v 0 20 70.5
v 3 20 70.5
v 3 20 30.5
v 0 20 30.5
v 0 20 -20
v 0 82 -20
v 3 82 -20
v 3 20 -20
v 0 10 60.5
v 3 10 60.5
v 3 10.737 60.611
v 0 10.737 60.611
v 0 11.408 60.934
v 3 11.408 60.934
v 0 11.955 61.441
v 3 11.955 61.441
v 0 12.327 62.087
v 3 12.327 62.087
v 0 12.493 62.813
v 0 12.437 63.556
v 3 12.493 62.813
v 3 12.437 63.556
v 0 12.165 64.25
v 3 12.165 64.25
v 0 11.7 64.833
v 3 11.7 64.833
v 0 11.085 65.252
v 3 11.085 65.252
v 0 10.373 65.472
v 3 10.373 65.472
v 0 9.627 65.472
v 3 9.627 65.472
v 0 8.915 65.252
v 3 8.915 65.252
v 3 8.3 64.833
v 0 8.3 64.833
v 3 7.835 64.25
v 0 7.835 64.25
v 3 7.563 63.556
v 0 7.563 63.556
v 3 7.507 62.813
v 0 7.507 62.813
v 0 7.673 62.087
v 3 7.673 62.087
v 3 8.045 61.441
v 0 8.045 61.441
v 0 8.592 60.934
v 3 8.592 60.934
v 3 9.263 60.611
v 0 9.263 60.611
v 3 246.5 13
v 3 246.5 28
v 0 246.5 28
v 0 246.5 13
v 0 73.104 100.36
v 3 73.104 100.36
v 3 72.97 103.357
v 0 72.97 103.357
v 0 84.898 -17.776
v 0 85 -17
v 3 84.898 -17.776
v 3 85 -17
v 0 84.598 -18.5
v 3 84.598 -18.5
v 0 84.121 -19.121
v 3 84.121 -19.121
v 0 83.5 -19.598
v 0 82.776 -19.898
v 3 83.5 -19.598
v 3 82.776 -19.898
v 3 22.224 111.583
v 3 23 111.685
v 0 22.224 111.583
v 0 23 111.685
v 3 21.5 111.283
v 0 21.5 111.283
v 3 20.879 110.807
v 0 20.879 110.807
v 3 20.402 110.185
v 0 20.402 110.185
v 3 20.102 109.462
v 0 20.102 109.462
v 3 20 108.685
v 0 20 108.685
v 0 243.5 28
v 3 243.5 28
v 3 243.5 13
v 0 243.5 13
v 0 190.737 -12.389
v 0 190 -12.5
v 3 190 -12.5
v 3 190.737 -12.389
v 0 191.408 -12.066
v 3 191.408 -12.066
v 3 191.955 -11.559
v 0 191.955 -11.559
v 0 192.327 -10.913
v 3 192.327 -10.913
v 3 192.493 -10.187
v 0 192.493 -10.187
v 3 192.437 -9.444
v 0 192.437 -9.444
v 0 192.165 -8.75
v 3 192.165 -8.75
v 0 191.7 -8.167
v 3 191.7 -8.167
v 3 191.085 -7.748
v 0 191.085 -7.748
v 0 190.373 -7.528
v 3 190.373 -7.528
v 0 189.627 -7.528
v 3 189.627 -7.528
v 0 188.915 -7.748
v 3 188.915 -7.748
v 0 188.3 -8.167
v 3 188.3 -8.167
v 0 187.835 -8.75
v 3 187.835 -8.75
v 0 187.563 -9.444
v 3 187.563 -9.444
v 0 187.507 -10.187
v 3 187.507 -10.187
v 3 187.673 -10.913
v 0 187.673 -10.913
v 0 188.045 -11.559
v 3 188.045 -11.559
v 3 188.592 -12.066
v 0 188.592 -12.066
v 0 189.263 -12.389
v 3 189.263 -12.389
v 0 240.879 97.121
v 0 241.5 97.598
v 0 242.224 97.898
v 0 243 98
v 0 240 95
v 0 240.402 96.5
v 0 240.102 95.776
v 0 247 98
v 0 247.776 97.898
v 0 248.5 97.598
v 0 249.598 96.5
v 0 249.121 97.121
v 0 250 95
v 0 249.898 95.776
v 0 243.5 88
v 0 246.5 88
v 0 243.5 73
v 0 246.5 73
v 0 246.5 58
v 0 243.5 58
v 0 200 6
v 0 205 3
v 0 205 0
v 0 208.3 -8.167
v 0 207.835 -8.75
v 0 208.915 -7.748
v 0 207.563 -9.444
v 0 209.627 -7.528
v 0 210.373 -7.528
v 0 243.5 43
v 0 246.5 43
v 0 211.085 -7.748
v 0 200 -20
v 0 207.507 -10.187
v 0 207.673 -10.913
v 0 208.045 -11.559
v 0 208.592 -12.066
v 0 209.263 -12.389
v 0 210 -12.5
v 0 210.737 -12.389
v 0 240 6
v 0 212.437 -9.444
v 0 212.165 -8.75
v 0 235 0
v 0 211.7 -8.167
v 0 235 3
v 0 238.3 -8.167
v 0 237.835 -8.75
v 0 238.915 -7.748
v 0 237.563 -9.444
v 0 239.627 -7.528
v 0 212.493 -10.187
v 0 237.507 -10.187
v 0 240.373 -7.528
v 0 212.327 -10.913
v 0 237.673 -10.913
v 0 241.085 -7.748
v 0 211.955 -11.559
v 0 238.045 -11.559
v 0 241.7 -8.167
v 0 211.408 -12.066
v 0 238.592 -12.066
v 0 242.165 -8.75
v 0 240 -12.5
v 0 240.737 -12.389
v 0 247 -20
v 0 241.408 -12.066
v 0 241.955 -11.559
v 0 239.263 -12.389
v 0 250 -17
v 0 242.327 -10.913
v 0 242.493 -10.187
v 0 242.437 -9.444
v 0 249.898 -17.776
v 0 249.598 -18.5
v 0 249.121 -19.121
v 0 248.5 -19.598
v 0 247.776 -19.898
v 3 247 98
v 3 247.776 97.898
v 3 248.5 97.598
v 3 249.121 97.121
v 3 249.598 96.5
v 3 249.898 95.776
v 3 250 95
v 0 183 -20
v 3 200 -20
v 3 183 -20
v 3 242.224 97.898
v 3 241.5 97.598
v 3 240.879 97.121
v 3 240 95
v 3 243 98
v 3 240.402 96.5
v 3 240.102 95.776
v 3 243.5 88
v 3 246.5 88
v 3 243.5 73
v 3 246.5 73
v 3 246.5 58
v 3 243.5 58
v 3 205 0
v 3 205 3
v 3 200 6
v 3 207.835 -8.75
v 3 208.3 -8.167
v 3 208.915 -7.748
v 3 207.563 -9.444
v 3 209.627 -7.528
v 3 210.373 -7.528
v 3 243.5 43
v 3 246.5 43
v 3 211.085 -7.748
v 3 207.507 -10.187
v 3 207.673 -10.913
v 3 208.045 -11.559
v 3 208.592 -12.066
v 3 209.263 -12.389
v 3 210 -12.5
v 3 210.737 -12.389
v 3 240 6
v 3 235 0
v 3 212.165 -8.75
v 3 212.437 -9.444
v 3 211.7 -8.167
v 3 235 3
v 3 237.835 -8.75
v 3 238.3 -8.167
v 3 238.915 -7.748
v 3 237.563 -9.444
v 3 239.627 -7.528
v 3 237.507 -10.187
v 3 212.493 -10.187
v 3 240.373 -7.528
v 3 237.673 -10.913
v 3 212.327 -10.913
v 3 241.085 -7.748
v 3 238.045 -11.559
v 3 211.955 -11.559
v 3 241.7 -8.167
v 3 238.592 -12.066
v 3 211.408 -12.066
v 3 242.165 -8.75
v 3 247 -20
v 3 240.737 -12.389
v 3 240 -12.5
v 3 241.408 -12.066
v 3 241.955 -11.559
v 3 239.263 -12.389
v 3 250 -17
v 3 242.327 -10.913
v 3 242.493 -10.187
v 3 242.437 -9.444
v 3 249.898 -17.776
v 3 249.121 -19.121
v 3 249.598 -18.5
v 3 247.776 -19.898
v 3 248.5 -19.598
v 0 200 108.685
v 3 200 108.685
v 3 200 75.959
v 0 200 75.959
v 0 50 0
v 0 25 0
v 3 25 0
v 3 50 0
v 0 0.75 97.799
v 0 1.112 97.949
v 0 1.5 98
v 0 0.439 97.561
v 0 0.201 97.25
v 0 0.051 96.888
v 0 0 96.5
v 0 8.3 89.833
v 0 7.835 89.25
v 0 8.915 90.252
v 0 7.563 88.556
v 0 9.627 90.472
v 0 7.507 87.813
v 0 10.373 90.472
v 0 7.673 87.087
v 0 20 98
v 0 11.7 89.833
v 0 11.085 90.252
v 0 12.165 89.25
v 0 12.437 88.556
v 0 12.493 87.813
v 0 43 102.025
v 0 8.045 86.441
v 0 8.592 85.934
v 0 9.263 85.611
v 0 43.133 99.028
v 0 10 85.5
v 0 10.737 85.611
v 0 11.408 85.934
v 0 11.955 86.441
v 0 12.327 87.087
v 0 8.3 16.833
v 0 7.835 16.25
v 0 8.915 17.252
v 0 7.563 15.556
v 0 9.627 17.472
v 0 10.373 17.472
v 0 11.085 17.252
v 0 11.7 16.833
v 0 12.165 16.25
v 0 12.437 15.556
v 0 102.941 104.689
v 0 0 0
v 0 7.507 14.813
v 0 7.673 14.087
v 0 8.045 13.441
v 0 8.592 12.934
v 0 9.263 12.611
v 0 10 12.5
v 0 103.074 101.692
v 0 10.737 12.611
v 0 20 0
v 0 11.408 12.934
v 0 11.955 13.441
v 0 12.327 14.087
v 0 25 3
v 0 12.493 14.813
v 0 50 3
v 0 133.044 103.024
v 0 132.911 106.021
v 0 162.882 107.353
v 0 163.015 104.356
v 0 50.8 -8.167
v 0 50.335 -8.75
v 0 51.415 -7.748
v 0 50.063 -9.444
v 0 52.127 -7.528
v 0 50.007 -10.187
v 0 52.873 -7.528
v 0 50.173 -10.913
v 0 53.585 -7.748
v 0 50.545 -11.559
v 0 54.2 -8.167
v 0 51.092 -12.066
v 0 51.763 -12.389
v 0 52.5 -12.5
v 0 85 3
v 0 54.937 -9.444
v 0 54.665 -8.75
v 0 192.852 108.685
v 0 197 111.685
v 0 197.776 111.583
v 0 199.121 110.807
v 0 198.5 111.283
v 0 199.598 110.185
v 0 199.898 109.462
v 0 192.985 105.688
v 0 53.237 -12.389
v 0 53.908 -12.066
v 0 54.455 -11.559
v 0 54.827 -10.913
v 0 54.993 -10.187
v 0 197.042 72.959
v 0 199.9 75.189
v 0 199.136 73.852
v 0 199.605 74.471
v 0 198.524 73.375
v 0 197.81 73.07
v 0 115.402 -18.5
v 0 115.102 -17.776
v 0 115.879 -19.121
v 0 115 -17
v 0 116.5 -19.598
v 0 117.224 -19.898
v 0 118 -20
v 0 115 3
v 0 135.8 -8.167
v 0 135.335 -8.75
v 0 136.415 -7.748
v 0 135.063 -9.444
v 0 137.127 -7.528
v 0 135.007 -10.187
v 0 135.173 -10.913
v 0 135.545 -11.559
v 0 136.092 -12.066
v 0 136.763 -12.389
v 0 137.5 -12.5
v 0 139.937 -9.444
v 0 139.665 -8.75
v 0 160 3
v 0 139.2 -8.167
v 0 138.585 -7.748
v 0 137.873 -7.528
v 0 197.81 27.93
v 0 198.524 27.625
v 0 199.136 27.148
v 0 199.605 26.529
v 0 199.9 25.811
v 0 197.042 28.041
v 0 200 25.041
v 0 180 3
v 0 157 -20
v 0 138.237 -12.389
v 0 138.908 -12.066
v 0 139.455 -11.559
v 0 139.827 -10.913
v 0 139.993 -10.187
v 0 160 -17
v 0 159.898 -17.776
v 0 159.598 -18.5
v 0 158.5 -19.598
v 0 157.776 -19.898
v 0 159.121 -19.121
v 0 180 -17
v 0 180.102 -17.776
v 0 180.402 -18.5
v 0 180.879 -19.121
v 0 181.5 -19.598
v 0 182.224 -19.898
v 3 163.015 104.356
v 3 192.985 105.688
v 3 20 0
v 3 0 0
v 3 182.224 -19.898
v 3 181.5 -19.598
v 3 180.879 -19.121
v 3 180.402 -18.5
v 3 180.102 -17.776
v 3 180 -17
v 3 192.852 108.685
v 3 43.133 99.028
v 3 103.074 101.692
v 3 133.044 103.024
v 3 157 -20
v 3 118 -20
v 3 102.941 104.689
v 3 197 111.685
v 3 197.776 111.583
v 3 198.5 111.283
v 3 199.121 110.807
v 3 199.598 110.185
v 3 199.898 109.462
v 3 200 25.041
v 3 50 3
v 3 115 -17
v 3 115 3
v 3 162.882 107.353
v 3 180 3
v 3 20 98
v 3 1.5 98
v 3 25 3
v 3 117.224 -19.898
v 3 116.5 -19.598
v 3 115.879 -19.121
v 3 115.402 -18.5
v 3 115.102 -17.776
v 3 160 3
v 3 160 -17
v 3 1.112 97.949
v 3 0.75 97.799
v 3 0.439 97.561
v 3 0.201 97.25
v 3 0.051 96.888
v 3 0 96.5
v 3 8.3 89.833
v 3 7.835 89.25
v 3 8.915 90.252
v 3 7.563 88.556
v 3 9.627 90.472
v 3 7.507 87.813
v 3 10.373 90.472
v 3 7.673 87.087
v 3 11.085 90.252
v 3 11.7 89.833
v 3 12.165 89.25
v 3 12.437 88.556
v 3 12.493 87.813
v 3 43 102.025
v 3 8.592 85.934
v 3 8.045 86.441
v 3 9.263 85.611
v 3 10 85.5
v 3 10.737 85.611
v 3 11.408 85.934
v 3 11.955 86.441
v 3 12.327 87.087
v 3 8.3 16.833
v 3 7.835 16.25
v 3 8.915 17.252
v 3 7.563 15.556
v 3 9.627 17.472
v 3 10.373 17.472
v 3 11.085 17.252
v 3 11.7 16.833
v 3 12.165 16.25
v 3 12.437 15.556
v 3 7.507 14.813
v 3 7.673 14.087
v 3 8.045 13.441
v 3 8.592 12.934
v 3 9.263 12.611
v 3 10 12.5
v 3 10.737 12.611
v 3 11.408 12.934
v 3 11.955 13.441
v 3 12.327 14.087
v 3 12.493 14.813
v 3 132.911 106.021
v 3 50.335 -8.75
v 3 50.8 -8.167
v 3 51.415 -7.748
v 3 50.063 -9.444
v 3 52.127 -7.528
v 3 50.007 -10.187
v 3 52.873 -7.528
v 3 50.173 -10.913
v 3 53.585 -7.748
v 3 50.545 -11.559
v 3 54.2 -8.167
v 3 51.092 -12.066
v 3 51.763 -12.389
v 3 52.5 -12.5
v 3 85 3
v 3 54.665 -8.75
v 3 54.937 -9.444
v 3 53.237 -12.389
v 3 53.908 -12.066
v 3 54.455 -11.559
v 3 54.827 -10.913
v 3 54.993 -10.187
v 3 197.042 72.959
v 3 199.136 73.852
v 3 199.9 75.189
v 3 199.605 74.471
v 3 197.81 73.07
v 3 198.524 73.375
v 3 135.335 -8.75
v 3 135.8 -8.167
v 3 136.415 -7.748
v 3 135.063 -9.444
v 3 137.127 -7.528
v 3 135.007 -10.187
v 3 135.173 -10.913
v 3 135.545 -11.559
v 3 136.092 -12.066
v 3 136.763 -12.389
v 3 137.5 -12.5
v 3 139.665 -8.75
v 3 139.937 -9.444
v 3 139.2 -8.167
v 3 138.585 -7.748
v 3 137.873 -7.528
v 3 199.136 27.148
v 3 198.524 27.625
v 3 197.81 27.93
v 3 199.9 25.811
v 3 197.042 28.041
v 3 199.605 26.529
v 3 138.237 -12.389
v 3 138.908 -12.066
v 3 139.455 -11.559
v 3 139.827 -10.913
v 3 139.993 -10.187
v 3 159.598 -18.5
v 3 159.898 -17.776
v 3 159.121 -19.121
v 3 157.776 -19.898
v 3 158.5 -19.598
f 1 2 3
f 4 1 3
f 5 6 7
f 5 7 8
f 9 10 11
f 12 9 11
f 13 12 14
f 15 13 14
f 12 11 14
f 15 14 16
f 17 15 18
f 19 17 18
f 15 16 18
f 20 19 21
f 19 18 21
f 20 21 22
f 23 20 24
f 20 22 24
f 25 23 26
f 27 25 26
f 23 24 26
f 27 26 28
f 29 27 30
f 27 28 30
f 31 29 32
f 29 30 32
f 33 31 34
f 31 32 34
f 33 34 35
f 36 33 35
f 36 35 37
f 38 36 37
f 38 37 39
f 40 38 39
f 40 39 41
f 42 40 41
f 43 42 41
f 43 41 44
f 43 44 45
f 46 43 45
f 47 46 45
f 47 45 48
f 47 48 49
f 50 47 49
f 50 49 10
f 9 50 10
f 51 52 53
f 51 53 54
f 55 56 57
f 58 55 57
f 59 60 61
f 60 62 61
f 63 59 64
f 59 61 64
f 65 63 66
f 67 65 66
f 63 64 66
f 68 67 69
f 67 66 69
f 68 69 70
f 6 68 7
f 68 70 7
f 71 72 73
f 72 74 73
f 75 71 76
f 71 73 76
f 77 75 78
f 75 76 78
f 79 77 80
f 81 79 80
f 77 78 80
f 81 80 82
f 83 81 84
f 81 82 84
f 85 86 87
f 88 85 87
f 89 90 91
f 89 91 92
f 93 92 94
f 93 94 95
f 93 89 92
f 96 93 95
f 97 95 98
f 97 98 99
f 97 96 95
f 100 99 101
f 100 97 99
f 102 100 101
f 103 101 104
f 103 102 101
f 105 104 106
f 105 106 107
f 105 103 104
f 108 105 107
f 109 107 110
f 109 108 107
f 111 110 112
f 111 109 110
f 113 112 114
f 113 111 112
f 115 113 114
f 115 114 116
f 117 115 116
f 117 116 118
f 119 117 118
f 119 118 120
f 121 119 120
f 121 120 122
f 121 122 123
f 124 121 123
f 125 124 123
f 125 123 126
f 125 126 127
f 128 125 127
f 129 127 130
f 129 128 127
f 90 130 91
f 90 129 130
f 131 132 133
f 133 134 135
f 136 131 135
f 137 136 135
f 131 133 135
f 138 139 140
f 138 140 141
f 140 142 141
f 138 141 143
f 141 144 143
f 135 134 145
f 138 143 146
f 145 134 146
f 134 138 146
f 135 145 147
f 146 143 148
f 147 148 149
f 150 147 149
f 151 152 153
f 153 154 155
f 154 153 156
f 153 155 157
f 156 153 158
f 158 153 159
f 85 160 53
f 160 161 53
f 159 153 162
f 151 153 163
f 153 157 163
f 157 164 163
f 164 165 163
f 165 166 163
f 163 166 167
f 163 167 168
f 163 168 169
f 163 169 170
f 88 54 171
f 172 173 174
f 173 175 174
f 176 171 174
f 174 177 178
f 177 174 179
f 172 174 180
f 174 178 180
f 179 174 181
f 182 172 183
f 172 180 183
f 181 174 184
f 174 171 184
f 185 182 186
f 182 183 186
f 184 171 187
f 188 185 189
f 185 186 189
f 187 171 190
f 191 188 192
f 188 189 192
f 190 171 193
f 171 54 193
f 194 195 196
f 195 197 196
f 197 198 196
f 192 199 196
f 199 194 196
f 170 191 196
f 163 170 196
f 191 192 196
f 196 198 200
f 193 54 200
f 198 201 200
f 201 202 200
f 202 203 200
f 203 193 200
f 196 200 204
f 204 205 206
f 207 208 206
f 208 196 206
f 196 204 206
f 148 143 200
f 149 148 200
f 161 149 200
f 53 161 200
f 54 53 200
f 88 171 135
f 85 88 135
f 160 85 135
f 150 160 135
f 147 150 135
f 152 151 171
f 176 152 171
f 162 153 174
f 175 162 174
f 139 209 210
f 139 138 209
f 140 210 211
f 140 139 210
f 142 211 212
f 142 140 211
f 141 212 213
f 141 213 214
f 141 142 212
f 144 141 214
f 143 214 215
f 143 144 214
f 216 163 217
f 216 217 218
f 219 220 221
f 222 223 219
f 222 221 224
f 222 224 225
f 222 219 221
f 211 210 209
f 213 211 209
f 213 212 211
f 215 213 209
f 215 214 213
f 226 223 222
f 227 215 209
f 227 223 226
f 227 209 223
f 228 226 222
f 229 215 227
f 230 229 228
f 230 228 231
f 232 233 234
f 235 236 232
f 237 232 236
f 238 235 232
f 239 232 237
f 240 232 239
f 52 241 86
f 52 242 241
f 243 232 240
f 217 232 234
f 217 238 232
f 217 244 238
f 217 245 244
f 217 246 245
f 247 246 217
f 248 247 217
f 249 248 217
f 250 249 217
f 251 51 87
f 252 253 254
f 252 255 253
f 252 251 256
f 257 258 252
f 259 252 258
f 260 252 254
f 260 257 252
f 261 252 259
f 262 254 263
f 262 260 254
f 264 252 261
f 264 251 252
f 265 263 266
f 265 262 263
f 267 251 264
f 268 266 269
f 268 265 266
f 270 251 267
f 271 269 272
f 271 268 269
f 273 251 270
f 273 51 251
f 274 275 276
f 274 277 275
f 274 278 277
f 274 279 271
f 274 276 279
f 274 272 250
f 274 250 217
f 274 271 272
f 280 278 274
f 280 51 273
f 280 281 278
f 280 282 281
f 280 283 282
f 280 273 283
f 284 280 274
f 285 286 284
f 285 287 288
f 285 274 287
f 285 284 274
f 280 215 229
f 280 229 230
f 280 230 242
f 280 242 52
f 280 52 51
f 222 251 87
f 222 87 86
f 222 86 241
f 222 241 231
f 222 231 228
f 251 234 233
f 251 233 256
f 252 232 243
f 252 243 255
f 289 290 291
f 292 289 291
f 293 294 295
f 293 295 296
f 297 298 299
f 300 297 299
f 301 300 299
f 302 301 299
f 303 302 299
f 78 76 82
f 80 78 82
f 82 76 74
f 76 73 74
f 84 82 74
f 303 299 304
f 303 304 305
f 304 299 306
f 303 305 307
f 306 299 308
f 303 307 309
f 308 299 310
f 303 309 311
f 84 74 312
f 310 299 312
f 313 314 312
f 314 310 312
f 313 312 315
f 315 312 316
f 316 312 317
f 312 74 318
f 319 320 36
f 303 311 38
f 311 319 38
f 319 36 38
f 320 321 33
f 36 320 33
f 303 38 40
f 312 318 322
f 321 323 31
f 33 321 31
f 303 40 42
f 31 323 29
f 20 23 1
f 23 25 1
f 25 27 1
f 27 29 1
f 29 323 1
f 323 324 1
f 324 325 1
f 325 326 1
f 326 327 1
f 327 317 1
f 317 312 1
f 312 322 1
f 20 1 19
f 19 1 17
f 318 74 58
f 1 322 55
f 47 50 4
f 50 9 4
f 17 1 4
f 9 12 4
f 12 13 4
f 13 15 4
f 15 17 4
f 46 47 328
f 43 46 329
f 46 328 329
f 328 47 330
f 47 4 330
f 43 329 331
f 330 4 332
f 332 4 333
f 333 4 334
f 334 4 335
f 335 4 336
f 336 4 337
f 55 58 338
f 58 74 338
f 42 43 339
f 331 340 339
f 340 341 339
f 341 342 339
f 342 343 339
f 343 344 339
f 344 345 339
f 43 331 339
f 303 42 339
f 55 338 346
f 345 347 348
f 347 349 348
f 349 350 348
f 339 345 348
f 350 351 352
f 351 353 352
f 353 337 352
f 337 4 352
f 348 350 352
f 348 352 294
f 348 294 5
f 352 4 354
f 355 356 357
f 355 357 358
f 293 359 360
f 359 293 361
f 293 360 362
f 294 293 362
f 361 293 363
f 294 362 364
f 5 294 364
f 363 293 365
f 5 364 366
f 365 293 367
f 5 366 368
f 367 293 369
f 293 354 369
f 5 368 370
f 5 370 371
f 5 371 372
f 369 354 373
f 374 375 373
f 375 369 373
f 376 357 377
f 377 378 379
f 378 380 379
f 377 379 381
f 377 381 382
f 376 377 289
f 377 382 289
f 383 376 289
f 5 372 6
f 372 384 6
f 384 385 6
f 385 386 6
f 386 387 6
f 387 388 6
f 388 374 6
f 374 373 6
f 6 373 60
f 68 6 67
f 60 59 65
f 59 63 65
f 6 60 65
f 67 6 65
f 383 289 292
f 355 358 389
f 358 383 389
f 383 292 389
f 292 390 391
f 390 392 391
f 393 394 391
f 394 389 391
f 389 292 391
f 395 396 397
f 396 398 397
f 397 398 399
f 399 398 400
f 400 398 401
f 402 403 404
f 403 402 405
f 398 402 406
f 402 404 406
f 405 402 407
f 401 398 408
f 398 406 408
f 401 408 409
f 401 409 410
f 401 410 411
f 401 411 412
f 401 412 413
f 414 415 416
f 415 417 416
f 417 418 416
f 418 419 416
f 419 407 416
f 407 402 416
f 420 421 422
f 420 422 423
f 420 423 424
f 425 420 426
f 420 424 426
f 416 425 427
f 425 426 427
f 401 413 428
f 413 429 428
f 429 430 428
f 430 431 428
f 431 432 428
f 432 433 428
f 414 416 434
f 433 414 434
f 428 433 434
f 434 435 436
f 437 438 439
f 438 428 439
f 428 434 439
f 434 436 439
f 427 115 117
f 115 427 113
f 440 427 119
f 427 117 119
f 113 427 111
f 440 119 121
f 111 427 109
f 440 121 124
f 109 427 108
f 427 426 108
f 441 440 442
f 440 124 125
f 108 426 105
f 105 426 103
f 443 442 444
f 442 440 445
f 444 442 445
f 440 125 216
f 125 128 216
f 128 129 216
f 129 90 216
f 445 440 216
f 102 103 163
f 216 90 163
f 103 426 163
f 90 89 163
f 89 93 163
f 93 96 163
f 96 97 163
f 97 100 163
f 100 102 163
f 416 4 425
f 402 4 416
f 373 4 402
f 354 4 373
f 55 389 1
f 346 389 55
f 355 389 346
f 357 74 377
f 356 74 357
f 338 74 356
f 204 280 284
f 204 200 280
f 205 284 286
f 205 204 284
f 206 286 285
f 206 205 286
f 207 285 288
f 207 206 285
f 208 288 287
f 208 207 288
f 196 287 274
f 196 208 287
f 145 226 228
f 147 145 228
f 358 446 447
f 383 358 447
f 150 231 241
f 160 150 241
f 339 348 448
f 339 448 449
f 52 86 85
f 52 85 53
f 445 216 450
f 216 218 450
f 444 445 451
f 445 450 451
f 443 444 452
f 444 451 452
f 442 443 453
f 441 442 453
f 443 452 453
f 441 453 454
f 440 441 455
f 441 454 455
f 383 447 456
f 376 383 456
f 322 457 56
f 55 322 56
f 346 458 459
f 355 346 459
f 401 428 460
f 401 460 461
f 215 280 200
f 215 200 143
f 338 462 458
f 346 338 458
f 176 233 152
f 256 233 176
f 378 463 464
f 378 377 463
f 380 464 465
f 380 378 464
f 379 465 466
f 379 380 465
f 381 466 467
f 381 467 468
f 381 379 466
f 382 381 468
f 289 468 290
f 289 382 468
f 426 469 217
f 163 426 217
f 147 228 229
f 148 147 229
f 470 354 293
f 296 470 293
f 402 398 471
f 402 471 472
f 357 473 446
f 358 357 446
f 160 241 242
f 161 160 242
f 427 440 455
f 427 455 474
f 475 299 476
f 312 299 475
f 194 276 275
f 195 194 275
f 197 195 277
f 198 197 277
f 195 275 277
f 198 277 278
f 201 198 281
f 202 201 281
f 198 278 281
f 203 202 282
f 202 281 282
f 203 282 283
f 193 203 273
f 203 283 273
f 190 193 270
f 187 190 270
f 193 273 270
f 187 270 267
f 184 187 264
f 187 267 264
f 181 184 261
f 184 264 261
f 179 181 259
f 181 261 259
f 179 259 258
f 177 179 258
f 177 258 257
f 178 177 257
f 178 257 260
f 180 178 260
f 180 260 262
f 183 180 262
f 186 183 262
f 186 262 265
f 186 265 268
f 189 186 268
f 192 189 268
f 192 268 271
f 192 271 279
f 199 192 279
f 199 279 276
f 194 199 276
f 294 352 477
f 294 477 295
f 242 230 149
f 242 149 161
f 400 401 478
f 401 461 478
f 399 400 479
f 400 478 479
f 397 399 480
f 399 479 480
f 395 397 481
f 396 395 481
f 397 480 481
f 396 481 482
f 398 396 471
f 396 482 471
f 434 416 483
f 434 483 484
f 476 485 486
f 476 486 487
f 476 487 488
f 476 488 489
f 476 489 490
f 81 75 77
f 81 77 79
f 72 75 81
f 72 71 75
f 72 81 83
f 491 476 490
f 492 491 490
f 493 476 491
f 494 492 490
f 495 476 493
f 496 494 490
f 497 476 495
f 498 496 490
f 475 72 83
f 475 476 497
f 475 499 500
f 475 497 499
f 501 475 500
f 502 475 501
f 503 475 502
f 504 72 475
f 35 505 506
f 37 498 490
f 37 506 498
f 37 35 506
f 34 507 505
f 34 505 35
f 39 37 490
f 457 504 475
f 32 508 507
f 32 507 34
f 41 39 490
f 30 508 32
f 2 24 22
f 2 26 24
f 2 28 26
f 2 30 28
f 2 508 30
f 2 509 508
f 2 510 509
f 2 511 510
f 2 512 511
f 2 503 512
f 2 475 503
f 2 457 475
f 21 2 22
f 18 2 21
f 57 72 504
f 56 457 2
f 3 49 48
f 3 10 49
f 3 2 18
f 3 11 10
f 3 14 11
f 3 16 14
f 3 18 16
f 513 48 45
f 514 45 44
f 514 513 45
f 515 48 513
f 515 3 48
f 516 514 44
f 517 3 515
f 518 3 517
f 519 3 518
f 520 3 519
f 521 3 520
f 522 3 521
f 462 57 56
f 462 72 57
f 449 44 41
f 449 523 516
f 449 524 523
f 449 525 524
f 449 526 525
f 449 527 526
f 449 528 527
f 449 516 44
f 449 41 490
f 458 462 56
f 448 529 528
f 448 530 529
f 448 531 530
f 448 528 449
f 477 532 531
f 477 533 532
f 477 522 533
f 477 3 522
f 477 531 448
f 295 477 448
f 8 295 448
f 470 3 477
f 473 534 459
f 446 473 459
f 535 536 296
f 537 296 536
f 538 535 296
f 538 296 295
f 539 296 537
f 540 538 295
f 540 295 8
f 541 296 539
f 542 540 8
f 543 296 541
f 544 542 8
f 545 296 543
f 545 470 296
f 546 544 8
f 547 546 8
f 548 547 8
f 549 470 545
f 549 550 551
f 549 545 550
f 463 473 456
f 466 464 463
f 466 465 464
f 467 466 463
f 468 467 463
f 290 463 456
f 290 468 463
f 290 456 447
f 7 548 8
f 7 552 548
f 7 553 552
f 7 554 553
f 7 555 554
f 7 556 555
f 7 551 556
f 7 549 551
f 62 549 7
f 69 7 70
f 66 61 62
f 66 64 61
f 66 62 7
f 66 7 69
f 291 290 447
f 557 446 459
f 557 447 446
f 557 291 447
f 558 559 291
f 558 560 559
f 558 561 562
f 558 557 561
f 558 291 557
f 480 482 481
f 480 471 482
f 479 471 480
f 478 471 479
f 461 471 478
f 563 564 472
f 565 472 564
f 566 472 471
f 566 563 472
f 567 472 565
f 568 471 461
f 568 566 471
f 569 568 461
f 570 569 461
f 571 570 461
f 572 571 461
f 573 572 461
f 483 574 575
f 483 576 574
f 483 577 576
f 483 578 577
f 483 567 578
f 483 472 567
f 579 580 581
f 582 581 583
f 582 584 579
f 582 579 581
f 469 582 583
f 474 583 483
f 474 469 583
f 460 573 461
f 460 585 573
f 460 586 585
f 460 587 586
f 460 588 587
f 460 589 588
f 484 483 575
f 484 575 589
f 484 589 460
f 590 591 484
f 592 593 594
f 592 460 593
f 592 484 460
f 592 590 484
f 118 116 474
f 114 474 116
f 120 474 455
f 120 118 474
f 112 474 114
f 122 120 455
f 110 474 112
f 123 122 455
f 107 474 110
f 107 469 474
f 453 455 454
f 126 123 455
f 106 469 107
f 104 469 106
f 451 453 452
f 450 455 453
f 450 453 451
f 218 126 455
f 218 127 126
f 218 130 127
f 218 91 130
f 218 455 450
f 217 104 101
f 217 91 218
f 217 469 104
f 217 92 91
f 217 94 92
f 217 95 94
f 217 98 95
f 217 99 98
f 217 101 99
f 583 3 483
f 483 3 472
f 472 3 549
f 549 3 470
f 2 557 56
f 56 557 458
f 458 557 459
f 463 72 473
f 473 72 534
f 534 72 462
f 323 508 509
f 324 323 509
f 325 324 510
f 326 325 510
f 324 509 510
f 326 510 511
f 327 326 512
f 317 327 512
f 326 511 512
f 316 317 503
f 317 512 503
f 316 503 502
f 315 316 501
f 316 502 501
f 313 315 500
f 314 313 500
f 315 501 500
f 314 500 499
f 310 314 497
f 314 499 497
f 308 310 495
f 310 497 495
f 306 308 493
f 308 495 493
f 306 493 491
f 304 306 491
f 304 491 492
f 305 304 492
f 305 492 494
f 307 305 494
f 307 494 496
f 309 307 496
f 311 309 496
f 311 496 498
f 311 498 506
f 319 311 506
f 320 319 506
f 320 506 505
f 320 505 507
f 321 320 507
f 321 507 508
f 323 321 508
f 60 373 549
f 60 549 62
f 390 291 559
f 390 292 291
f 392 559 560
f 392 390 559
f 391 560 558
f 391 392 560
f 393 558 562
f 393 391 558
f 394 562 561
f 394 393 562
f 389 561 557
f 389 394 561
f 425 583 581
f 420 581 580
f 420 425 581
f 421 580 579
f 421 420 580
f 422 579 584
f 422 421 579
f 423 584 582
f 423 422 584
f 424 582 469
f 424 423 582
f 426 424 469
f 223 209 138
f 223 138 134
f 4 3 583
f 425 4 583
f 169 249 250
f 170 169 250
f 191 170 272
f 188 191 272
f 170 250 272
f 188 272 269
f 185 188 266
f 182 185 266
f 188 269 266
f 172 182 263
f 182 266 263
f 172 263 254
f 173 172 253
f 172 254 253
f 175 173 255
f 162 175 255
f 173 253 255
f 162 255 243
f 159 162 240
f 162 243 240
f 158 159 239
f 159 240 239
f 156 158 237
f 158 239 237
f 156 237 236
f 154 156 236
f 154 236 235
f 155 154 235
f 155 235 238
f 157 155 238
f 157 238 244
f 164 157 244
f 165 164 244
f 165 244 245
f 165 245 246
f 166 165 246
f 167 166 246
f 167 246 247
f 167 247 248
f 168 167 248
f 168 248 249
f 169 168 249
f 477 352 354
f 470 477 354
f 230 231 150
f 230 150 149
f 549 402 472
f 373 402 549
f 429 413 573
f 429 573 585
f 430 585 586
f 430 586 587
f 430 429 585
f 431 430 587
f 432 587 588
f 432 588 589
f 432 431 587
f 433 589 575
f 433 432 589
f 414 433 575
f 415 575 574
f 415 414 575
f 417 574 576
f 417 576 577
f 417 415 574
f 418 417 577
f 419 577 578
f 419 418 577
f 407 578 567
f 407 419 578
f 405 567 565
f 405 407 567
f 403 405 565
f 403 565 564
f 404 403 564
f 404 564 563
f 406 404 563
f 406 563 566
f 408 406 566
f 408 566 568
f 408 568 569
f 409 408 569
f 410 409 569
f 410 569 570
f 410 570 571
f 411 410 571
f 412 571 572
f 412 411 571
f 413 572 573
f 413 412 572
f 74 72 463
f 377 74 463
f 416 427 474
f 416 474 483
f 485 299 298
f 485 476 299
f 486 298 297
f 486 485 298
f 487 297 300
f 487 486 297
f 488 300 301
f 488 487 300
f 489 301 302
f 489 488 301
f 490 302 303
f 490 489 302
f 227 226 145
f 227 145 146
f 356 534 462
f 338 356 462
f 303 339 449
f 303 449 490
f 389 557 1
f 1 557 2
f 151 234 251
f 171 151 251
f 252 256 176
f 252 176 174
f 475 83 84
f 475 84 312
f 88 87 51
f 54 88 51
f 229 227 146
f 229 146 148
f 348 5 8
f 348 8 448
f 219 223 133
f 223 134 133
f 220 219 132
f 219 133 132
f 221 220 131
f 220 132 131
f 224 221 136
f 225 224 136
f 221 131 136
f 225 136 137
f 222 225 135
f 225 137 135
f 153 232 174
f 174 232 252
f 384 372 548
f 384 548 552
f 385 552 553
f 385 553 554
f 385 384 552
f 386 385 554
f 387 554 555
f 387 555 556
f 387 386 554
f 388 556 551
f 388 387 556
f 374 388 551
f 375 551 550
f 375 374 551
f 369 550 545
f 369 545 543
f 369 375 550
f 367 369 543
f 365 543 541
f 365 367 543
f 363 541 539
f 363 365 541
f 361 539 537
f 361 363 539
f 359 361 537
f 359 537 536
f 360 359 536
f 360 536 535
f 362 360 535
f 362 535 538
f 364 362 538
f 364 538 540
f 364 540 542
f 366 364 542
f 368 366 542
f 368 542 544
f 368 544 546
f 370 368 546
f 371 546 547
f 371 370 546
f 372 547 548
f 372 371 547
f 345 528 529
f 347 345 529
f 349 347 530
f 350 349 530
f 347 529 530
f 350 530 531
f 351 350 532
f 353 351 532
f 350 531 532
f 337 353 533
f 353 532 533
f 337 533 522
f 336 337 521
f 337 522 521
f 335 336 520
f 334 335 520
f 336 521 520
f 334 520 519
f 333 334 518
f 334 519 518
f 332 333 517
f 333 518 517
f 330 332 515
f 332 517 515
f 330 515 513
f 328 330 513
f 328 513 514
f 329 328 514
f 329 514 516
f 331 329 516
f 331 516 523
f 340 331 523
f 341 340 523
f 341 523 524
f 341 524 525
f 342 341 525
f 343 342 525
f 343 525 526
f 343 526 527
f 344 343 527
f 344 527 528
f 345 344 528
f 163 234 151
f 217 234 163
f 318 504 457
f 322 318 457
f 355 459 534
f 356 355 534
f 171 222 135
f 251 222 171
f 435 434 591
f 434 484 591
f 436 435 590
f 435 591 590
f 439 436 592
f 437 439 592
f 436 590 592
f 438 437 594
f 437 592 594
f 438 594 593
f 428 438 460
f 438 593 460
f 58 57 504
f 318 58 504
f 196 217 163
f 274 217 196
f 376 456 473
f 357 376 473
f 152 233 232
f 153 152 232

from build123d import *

# Parameters (mm, degrees)
SKETCH1_R           = 2.5
SKETCH1_W           = 3
SKETCH1_H           = 25
BOSS_EXTRUDE1_DEPTH = 3
SKETCH4_W           = 15
SKETCH4_H           = 3
BOSS_EXTRUDE2_DEPTH = 3
SKETCH5_W           = 13.685275767
SKETCH5_H           = 180
BOSS_EXTRUDE3_DEPTH = 3
CUT_EXTRUDE3_DEPTH  = 4
FILLET1_R           = 3
SKETCH12_R          = 2.5
CUT_EXTRUDE7_DEPTH  = 4
FILLET2_R           = 1.5
SKETCH13_R          = 2.5
CUT_EXTRUDE8_DEPTH  = 4
SKETCH15_R          = 2.5
CUT_EXTRUDE9_DEPTH  = 10
SKETCH17_W          = 3
SKETCH17_H          = 30
CUT_EXTRUDE10_DEPTH = 4
SKETCH16_W          = 3
SKETCH16_H          = 40
BOSS_EXTRUDE4_DEPTH = 3
FILLET3_R           = 3


with BuildPart() as part:
    # Sketch1 → Boss-Extrude1 (new body)
    with BuildSketch(Plane(origin=(0, 0, 0), x_dir=(0, 0, -1), z_dir=(1, 0, 0))):
        Polygon((0, 0), (-98, 0), (-98, 200), (20, 200), (20, 180), (-3, 180), (-3, 160), (20, 160), (20, 115), (-3, 115), (-3, 85), (20, 85), (20, 20), (0, 20), align=None)
        with Locations((10, 190)):
            Circle(SKETCH1_R, mode=Mode.SUBTRACT)
        with Locations((10, 137.5)):
            Circle(SKETCH1_R, mode=Mode.SUBTRACT)
        with Locations((10, 52.5)):
            Circle(SKETCH1_R, mode=Mode.SUBTRACT)
        with Locations((-1.5, 37.5)):
            Rectangle(SKETCH1_W, SKETCH1_H, mode=Mode.SUBTRACT)
    extrude(amount=BOSS_EXTRUDE1_DEPTH)

    # Sketch5 → Boss-Extrude3 (add)
    with BuildSketch(Plane(origin=(3, 0, 0), x_dir=(0, 0, -1), z_dir=(1, 0, 0))):
        with Locations((-104.842637884, 110)):
            Rectangle(SKETCH5_W, SKETCH5_H)
        Polygon((-105.688234347, 192.985272811), (-108.685275767, 192.85207097), (-107.353257358, 162.881656776), (-104.356215939, 163.014858617), align=None, mode=Mode.SUBTRACT)
        Polygon((-103.02419753, 133.044444423), (-106.021238949, 132.911242582), (-104.689220541, 102.940828388), (-101.692179121, 103.074030229), align=None, mode=Mode.SUBTRACT)
        Polygon((-100.360160713, 73.103616035), (-103.357202132, 72.970414194), (-102.025183723, 43), (-99.028142304, 43.133201841), align=None, mode=Mode.SUBTRACT)
    extrude(amount=-BOSS_EXTRUDE3_DEPTH)

    # Sketch6 → Cut-Extrude3 (cut)
    with BuildSketch(Plane(origin=(3, 0, 0), x_dir=(0, 0, -1), z_dir=(1, 0, 0))):
        Polygon((-28, 200), (-73, 200), (-70.5, 20), (-30.5, 20), align=None)
    extrude(amount=-CUT_EXTRUDE3_DEPTH, mode=Mode.SUBTRACT)

    # Fillet1
    fillet1_edges = [part.edges().sort_by_distance(p)[0] for p in [
        (1.5, 200, 28),
        (1.5, 200, 73),
        (1.5, 180, -20),
        (1.5, 160, -20),
        (1.5, 115, -20),
        (1.5, 85, -20),
        (1.5, 20, 111.685275767),
        (1.5, 200, 111.685275767),
    ]]
    fillet(fillet1_edges, radius=FILLET1_R)

    # Sketch12 → Cut-Extrude7 (cut)
    with BuildSketch(Plane(origin=(3, 0, 0), x_dir=(0, 0, -1), z_dir=(1, 0, 0))):
        with Locations((-88, 10)):
            Circle(SKETCH12_R)
    extrude(amount=-CUT_EXTRUDE7_DEPTH, mode=Mode.SUBTRACT)

    # Fillet2
    fillet2_edges = [part.edges().sort_by_distance(p)[0] for p in [
        (1.5, 0, 98),
    ]]
    fillet(fillet2_edges, radius=FILLET2_R)

    # Sketch13 → Cut-Extrude8 (cut, through all)
    with BuildSketch(Plane(origin=(3, 0, 0), x_dir=(0, 0, -1), z_dir=(1, 0, 0))):
        with Locations((-63, 10)):
            Circle(SKETCH13_R)
        with Locations((-15, 10)):
            Circle(SKETCH13_R)
    extrude(amount=-CUT_EXTRUDE8_DEPTH, mode=Mode.SUBTRACT)


with BuildPart() as body_2:
    # Sketch4 → Boss-Extrude2 (new body)
    with BuildSketch(Plane(origin=(3, 0, 0), x_dir=(0, 0, -1), z_dir=(1, 0, 0))):
        Polygon((-98, 240), (-3, 240), (-3, 200), (20, 200), (20, 250), (-3, 250), (-98, 250), align=None)
        with Locations((-80.5, 245)):
            Rectangle(SKETCH4_W, SKETCH4_H, mode=Mode.SUBTRACT)
        with Locations((-50.5, 245)):
            Rectangle(SKETCH4_W, SKETCH4_H, mode=Mode.SUBTRACT)
        with Locations((-20.5, 245)):
            Rectangle(SKETCH4_W, SKETCH4_H, mode=Mode.SUBTRACT)
    extrude(amount=-BOSS_EXTRUDE2_DEPTH)

    # Sketch15 → Cut-Extrude9 (cut)
    with BuildSketch(Plane(origin=(3, 0, 0), x_dir=(0, 0, -1), z_dir=(1, 0, 0))):
        with Locations((10, 240)):
            Circle(SKETCH15_R)
        with Locations((10, 210)):
            Circle(SKETCH15_R)
    extrude(amount=-CUT_EXTRUDE9_DEPTH, mode=Mode.SUBTRACT)

    # Sketch17 → Cut-Extrude10 (cut, through all)
    with BuildSketch(Plane(origin=(3, 0, 0), x_dir=(0, 0, -1), z_dir=(1, 0, 0))):
        with Locations((-1.5, 220)):
            Rectangle(SKETCH17_W, SKETCH17_H)
    extrude(amount=-CUT_EXTRUDE10_DEPTH, mode=Mode.SUBTRACT)

    # Sketch16 → Boss-Extrude4 (add)
    with BuildSketch(Plane(origin=(3, 0, 0), x_dir=(0, 0, -1), z_dir=(1, 0, 0))):
        with Locations((-4.5, 220)):
            Rectangle(SKETCH16_W, SKETCH16_H)
    extrude(amount=-BOSS_EXTRUDE4_DEPTH)

    # Fillet3
    fillet3_edges = [body_2.edges().sort_by_distance(p)[0] for p in [
        (1.5, 240, 98),
        (1.5, 250, 98),
        (1.5, 250, -20),
    ]]
    fillet(fillet3_edges, radius=FILLET3_R)


solid = Compound([part.part, body_2.part])
